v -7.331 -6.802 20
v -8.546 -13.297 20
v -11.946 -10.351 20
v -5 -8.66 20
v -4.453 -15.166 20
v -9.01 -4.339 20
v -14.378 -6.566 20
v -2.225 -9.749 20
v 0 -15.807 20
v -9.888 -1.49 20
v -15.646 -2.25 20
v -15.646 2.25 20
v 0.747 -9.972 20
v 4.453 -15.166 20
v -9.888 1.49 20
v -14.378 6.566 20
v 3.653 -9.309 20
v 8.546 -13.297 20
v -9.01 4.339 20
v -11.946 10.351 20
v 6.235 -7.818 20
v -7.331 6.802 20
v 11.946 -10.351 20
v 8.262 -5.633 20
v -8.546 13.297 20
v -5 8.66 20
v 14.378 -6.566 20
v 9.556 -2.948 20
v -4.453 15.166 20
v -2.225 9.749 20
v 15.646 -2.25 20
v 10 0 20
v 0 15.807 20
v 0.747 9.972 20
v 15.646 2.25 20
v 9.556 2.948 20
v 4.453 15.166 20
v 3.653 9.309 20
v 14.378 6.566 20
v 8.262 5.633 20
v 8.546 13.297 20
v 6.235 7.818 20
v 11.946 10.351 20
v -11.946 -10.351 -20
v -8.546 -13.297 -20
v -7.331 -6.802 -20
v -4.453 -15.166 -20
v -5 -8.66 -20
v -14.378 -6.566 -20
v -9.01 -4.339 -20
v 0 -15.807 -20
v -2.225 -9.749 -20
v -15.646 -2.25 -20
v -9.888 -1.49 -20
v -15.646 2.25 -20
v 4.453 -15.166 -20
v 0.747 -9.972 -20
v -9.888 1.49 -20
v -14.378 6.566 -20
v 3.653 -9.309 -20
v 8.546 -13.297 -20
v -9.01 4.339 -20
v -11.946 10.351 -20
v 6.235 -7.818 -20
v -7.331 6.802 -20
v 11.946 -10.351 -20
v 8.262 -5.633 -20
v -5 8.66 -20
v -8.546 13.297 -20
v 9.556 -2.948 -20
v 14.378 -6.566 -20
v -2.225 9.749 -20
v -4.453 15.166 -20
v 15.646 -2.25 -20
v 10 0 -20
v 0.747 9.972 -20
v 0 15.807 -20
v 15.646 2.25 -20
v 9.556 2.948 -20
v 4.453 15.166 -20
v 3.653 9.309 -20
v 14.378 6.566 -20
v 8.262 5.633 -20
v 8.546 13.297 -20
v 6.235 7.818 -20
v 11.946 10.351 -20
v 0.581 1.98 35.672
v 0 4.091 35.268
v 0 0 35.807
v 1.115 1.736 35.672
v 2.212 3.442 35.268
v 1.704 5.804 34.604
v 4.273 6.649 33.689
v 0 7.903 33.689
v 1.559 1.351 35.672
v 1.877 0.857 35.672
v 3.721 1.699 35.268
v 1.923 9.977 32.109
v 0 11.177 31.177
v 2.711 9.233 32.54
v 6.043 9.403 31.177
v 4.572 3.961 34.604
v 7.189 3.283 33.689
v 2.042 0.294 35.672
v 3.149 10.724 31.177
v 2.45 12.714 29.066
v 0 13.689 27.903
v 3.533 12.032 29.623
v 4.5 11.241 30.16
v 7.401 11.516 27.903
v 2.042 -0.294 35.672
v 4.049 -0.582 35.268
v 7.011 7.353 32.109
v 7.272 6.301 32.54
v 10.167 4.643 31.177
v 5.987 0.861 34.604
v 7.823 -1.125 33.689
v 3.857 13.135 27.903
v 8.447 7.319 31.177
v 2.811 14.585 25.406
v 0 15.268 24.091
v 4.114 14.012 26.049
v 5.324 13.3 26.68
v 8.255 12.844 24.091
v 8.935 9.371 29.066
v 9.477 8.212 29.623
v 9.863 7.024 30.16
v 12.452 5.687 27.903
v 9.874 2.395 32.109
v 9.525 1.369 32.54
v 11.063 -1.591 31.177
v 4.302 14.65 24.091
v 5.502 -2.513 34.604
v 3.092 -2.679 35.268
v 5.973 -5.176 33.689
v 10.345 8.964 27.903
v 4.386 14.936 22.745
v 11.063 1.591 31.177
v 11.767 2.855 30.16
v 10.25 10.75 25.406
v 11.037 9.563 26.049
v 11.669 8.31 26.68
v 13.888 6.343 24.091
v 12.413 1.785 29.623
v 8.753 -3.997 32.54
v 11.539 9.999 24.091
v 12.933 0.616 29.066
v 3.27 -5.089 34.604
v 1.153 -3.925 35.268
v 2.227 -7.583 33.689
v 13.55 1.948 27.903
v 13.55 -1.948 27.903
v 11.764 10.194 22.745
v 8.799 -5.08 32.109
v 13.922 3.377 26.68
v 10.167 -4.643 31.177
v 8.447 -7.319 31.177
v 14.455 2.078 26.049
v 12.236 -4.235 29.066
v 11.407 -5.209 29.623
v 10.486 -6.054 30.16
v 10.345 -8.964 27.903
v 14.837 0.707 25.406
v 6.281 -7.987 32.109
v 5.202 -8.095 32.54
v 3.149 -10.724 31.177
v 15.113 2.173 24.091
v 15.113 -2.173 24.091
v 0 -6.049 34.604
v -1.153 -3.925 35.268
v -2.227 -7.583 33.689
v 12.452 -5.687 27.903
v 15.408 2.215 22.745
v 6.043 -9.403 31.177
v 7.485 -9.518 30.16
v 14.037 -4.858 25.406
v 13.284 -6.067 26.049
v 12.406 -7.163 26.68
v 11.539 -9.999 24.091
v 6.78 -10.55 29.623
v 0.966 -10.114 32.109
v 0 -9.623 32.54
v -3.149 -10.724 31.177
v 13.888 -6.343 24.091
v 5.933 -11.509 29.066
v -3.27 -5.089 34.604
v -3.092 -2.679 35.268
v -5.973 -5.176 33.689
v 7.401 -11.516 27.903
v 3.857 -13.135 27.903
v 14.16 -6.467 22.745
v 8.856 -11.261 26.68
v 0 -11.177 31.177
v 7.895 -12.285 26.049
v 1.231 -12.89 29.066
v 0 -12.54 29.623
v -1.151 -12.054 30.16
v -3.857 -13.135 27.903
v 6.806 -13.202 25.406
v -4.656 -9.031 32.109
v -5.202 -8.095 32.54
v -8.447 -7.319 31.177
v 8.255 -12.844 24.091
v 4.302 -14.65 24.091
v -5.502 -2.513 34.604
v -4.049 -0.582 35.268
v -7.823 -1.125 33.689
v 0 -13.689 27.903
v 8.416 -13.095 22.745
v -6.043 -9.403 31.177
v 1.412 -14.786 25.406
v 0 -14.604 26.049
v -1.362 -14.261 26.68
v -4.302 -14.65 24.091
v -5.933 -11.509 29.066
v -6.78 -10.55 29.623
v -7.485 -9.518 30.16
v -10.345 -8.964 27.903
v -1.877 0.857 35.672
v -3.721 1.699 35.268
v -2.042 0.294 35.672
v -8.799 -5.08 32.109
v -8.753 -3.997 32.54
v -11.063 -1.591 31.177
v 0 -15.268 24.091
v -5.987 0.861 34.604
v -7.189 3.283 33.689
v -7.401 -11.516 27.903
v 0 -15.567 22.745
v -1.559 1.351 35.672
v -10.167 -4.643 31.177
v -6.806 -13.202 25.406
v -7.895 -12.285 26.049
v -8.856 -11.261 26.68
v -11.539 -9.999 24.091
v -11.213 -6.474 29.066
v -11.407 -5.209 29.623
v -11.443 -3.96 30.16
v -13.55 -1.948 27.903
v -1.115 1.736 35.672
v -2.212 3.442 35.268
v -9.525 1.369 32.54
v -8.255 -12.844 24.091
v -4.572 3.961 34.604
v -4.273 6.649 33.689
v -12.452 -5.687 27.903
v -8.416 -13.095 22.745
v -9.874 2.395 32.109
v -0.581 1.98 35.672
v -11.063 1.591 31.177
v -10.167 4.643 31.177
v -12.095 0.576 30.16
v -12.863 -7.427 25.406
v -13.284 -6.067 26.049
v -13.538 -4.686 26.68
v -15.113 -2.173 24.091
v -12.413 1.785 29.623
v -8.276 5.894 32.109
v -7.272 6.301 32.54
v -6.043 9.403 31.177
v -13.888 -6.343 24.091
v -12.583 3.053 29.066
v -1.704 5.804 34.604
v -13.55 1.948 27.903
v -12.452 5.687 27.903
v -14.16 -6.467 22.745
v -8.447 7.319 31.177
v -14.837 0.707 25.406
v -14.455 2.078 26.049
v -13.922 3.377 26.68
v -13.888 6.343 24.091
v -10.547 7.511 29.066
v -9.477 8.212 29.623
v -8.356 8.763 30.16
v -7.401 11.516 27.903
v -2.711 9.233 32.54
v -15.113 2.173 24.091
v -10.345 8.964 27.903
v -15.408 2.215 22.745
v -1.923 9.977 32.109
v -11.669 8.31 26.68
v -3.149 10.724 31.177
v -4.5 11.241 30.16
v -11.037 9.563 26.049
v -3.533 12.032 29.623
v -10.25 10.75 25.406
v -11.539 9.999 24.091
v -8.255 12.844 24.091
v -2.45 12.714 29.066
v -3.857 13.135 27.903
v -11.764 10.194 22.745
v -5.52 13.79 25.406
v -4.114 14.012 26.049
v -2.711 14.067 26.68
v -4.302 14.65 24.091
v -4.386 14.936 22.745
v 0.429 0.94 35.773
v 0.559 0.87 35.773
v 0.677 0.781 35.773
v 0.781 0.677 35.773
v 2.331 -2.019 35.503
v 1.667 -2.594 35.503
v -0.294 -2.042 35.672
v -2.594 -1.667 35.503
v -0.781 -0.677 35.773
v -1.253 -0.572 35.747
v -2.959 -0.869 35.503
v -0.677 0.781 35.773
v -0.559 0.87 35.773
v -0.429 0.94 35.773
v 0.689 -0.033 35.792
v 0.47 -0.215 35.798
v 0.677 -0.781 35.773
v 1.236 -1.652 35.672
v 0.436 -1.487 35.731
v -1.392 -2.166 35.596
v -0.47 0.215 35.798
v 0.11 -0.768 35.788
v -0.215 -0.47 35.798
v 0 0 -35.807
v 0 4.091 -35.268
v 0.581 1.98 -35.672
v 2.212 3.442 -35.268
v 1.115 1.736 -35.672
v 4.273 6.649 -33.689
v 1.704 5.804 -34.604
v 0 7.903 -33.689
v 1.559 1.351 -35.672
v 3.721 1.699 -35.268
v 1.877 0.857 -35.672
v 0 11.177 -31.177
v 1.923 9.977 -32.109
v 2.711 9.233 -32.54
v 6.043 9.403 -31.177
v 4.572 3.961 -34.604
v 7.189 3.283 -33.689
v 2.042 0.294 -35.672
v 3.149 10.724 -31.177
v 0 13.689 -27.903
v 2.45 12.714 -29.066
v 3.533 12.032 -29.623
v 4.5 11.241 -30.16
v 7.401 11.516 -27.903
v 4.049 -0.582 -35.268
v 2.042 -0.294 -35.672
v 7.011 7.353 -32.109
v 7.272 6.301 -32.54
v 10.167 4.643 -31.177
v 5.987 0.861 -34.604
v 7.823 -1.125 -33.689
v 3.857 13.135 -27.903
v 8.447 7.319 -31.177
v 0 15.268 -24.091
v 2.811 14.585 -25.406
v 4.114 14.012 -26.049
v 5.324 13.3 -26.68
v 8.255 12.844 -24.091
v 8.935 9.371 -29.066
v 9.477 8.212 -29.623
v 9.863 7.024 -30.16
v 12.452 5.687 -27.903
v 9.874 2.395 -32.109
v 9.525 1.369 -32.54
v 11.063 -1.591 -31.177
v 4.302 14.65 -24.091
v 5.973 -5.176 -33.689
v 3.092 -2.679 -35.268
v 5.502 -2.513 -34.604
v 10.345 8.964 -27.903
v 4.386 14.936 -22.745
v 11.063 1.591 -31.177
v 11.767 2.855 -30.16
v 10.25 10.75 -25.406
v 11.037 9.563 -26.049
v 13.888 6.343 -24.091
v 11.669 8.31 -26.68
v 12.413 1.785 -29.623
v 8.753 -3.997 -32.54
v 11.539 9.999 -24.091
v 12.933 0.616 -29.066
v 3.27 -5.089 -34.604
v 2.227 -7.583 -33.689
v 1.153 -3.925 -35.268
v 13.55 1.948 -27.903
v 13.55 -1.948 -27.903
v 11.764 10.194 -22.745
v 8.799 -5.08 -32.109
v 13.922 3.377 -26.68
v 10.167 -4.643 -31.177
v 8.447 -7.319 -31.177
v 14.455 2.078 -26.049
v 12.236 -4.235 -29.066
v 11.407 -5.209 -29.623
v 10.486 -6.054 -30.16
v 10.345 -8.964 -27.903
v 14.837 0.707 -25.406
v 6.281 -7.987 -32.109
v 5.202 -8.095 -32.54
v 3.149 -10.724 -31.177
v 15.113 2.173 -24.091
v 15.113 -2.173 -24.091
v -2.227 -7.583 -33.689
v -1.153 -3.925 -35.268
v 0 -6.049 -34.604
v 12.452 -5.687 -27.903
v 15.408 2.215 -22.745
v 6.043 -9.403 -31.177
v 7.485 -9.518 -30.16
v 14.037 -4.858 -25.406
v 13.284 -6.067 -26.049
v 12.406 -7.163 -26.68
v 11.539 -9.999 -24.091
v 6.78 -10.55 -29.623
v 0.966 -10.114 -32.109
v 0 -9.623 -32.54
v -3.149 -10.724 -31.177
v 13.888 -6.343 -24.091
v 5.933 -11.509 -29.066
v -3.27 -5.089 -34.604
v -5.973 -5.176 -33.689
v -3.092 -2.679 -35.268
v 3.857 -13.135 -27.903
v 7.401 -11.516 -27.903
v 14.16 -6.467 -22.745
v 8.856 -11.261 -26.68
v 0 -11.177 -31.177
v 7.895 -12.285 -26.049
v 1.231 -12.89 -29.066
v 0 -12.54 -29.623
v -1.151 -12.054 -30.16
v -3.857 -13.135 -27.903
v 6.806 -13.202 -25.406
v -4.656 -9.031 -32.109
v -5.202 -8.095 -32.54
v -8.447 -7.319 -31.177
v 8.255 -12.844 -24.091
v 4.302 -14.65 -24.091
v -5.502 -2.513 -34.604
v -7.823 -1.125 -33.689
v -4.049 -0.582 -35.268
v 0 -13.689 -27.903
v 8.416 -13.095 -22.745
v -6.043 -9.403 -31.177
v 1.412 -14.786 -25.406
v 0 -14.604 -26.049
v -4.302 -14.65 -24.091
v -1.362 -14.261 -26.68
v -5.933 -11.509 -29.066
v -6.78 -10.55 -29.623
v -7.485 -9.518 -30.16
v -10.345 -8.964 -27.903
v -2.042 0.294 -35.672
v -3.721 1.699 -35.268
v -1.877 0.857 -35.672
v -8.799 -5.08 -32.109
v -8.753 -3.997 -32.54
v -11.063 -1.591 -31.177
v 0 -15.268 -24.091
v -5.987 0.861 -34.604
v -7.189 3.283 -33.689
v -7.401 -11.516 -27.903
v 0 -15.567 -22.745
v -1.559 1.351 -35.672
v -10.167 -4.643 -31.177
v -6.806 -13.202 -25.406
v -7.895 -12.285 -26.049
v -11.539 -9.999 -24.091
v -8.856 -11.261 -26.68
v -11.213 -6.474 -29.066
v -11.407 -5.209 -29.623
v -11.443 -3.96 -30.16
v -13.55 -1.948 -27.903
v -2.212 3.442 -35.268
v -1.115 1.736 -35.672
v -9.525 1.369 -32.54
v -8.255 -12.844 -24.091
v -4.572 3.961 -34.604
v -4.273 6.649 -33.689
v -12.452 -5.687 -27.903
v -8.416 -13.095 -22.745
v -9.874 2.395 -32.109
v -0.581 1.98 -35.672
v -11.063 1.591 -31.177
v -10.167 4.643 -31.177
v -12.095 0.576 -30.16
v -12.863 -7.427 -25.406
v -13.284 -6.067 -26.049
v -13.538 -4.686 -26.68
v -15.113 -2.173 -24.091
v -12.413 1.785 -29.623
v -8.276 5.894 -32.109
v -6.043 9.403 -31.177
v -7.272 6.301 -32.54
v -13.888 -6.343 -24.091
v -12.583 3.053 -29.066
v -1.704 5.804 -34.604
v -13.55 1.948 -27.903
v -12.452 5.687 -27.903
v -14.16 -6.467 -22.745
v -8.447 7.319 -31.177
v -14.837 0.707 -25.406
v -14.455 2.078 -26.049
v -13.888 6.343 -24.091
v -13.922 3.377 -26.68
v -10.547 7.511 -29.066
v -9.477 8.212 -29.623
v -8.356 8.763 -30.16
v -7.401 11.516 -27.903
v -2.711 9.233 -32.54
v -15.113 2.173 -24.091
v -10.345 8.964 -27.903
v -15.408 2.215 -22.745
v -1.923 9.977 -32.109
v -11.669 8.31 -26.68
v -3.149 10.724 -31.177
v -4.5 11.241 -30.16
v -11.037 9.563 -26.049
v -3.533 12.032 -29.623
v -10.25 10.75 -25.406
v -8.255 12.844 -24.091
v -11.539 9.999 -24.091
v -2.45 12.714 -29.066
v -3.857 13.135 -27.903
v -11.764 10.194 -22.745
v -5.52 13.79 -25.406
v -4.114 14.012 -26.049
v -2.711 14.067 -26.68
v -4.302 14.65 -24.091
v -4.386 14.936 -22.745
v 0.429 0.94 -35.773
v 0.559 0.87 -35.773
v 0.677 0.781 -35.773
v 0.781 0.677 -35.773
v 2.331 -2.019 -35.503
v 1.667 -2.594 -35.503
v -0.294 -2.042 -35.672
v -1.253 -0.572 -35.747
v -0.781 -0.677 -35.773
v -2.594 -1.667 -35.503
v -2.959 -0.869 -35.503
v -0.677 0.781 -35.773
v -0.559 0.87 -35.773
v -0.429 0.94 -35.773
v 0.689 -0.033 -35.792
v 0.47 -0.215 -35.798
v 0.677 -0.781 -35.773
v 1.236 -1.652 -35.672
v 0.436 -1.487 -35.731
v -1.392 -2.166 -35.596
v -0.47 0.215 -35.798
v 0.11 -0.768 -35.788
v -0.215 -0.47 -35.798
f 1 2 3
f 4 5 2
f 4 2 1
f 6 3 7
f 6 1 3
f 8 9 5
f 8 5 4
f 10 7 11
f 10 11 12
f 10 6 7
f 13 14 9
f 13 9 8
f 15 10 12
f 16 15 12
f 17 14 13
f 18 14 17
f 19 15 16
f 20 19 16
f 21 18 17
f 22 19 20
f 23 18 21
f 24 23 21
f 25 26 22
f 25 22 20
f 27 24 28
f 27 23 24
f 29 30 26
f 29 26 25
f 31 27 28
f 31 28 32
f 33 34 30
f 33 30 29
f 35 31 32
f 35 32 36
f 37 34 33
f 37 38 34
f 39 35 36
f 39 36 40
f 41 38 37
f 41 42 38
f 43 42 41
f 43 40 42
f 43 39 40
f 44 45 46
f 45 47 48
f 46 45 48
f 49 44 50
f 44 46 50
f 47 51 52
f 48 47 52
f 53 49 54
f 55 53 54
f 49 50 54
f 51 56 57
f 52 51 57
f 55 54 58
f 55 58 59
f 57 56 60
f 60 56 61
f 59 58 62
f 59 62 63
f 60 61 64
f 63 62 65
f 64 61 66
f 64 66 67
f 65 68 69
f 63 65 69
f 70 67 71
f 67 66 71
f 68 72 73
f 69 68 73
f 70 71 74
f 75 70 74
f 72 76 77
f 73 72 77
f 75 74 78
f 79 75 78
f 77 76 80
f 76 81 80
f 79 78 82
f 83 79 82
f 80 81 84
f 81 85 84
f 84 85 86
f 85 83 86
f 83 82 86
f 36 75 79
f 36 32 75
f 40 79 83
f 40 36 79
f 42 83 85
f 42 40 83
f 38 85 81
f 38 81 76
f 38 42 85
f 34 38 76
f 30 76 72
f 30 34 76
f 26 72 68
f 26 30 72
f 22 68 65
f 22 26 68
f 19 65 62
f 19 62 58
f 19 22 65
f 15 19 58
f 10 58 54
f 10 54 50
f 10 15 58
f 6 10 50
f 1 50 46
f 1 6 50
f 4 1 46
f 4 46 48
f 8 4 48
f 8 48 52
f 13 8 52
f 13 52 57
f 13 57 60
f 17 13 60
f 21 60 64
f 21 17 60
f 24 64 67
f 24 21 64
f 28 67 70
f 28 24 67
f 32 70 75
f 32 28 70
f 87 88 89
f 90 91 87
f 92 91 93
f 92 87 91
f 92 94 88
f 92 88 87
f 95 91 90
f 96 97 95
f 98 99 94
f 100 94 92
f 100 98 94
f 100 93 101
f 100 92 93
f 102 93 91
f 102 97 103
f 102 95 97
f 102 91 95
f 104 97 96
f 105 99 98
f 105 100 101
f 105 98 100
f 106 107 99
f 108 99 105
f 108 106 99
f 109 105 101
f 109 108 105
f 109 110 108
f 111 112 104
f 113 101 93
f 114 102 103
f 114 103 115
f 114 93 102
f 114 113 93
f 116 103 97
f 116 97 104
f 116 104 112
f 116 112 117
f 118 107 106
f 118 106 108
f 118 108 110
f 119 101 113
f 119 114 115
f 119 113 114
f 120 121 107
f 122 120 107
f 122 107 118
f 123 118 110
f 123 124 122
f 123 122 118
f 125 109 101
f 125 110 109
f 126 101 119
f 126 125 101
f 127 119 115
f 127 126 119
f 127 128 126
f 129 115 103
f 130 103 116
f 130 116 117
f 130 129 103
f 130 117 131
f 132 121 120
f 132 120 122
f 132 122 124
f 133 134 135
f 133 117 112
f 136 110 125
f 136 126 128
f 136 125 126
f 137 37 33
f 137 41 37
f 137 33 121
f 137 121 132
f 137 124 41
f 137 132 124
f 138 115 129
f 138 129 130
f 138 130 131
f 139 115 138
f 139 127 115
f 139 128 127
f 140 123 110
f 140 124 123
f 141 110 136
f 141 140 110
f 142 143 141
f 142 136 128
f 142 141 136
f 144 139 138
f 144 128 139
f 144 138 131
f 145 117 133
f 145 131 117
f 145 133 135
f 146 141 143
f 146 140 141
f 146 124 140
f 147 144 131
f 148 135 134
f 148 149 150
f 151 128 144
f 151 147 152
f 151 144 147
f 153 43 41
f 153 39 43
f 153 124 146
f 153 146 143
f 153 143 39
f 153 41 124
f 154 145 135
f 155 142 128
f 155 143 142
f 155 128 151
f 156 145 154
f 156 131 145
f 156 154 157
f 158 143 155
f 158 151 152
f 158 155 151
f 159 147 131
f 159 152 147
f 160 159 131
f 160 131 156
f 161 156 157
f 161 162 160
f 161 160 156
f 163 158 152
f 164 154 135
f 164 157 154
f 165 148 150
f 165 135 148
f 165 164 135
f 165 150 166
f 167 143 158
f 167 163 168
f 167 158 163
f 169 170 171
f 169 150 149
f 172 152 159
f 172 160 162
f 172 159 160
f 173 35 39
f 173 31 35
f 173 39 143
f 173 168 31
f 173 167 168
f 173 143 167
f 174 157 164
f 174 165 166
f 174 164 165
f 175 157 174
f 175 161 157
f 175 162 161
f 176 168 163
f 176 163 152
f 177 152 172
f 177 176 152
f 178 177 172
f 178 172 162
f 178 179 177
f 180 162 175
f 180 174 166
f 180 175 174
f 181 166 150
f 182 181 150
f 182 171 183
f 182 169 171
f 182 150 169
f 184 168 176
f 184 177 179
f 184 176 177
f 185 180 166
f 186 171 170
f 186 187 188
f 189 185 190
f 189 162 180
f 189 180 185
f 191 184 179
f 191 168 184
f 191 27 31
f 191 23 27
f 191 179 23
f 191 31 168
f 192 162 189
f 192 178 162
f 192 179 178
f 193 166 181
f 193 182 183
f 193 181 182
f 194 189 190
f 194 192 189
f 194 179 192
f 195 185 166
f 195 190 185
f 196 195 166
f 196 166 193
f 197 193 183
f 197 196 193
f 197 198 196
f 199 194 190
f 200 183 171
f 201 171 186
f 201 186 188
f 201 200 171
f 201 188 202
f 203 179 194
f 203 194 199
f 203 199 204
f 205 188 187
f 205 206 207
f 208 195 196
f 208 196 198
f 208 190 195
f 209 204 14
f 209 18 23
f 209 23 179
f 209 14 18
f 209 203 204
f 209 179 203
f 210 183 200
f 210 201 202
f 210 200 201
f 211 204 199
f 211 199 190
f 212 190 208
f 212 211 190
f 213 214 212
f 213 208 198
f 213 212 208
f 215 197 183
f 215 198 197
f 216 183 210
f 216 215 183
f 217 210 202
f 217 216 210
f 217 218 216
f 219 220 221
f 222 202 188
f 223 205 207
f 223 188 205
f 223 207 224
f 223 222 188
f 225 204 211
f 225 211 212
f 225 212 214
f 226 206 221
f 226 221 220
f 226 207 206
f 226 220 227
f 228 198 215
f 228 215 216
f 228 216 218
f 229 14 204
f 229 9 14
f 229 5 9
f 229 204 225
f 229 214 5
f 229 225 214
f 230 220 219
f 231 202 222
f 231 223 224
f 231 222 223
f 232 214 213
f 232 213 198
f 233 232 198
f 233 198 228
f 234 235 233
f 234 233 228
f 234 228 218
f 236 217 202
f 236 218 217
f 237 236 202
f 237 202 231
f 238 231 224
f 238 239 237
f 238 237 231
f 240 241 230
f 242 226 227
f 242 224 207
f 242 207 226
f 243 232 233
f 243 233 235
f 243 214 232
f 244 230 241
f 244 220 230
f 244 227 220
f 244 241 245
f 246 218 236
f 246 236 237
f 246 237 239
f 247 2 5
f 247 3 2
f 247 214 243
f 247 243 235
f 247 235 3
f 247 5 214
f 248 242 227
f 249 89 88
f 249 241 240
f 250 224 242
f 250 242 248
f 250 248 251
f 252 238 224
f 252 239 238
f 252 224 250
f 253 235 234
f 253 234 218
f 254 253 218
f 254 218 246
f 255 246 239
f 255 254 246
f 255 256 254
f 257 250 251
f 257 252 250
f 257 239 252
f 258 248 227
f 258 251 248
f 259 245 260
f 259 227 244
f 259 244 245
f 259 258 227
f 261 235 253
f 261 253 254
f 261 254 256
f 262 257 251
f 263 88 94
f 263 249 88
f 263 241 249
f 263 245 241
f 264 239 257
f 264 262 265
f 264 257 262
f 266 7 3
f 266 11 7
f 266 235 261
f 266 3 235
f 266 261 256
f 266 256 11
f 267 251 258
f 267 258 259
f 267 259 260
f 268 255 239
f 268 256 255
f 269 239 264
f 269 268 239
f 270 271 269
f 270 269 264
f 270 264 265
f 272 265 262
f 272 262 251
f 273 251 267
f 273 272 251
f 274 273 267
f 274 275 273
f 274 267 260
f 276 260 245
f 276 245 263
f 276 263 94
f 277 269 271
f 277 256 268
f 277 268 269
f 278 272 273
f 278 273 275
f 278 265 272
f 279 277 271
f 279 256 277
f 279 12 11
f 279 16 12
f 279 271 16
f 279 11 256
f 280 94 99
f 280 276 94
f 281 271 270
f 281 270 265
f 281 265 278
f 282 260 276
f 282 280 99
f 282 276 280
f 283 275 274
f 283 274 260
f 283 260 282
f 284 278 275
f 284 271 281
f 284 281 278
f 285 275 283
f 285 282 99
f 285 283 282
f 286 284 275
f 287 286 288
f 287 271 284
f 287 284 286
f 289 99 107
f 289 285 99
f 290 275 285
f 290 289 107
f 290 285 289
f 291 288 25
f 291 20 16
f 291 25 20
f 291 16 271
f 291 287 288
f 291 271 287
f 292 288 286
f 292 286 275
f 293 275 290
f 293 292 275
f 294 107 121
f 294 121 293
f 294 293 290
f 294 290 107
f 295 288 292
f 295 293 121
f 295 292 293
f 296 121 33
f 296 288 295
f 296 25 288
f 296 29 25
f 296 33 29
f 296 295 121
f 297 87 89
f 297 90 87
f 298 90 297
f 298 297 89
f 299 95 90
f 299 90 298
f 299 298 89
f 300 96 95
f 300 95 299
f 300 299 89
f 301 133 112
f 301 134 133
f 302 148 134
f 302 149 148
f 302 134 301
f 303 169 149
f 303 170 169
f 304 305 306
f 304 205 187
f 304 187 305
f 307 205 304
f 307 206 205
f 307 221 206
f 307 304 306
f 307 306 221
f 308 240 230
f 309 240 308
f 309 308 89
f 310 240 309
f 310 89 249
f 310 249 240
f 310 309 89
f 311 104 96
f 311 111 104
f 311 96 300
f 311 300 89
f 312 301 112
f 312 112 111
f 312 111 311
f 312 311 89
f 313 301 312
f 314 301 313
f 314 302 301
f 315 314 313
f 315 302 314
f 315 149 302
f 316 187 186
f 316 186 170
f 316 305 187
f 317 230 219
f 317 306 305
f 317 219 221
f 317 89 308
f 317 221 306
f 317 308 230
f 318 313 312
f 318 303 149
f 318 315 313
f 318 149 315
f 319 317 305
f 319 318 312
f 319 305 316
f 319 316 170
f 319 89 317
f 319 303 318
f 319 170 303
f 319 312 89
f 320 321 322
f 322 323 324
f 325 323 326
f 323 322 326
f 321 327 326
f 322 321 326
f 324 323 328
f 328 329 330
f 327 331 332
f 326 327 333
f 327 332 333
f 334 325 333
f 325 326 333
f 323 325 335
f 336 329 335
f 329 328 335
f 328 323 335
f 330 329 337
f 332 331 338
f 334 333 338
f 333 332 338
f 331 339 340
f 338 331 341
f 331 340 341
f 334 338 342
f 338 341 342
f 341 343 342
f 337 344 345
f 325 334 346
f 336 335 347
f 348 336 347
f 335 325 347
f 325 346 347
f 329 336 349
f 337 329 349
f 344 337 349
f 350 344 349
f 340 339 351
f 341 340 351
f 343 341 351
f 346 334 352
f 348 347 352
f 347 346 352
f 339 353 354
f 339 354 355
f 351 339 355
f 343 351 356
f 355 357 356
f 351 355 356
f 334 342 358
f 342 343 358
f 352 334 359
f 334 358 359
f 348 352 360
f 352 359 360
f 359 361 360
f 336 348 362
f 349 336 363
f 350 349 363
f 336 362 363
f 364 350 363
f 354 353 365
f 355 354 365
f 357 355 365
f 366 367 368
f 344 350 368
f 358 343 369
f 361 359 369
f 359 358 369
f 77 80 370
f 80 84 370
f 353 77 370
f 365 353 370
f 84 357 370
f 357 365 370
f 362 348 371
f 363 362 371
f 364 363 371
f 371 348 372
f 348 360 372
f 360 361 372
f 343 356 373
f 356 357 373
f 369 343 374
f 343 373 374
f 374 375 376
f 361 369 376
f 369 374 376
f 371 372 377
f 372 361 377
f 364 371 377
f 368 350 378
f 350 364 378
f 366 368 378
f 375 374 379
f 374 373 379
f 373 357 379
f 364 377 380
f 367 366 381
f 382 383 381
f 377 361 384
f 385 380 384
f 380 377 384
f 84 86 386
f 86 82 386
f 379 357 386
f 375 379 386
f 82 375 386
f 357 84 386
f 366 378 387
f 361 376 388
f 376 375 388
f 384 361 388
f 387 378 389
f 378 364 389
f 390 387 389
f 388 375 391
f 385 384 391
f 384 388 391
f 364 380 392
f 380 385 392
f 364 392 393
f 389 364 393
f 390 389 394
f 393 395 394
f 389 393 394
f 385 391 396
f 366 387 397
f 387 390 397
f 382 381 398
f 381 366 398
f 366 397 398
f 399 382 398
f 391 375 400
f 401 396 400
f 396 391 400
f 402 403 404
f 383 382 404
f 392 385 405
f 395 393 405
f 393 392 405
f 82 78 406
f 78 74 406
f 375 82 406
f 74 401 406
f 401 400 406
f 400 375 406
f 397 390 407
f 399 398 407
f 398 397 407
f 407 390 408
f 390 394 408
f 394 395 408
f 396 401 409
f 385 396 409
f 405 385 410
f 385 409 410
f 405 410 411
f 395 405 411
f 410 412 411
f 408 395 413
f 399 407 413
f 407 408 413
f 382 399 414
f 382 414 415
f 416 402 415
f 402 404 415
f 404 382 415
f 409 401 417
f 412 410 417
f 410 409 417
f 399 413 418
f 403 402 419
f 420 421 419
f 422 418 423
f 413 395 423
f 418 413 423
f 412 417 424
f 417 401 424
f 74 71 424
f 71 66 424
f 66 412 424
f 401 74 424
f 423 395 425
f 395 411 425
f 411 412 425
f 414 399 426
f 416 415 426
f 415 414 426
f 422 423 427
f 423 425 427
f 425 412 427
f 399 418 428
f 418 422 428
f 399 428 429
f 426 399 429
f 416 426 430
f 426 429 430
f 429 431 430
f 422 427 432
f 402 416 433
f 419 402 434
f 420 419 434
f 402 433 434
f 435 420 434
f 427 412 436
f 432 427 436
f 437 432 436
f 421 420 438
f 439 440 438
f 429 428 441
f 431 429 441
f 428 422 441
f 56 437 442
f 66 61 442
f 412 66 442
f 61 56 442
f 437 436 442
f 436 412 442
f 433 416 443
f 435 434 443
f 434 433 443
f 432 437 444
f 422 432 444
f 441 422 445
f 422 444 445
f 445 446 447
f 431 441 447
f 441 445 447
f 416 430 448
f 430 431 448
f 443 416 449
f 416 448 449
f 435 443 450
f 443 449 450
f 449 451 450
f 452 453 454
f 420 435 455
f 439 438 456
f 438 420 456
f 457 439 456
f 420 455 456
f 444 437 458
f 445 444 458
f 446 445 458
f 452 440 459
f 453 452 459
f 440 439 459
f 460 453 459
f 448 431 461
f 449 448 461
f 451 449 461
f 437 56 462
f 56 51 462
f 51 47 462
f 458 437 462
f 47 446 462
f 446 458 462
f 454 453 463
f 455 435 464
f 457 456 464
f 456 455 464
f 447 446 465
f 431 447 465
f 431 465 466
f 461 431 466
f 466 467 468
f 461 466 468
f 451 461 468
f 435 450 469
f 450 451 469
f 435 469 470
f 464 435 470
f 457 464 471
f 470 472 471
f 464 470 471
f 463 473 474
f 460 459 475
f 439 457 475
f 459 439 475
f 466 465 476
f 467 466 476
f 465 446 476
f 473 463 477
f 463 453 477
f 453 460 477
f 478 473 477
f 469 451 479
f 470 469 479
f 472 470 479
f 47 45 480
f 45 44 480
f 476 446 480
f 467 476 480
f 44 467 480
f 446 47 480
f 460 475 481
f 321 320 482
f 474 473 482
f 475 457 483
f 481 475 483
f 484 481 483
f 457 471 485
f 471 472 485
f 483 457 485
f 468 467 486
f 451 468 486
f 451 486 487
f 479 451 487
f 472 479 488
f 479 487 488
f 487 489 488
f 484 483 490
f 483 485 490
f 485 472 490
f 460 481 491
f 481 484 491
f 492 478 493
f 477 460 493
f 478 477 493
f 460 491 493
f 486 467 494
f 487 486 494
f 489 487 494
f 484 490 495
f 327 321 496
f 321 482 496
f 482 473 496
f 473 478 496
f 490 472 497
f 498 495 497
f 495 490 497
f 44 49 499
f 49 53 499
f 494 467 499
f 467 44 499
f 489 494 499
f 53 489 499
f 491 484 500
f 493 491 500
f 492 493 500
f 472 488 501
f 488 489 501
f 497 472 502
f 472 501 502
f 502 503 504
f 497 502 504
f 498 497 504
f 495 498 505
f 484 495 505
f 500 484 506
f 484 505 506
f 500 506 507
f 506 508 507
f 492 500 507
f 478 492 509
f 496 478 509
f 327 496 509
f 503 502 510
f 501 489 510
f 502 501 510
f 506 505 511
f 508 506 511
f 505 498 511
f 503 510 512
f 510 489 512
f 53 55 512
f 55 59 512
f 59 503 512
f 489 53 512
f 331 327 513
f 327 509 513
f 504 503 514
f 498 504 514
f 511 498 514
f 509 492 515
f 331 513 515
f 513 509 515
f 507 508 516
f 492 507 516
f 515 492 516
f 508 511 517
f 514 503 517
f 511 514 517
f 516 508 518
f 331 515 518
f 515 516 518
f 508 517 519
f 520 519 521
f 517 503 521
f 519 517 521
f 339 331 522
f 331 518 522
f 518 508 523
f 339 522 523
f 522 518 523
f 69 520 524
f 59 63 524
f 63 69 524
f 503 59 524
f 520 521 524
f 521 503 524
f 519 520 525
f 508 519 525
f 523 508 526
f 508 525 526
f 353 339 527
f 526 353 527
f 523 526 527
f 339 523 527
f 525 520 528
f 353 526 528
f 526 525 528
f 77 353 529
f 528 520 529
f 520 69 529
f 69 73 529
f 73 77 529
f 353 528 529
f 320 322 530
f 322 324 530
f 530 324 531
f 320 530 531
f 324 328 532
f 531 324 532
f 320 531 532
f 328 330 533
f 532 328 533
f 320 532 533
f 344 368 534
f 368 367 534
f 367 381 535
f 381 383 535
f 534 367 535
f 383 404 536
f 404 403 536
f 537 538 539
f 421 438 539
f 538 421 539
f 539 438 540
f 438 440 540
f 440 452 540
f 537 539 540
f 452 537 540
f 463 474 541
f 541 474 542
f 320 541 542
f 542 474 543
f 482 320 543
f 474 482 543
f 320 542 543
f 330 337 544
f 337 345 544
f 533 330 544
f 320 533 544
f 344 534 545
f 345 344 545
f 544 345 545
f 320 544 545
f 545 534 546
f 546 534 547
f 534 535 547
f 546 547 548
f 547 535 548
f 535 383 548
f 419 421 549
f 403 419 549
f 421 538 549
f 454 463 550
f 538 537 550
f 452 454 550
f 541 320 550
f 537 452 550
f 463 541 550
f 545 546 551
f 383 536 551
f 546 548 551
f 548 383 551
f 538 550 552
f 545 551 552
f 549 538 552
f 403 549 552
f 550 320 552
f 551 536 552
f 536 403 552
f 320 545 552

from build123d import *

# Parameters (mm, degrees)
F0_R     = 10
F1_DEPTH = 20


with BuildPart() as f1:
    # F0 (on Top) → F1 (new body, symmetric)
    with BuildSketch(Plane.XY):
        Circle(F0_R)
    extrude(amount=F1_DEPTH, both=True)

    # F2 (on Right) → F3 (revolve)
    with BuildSketch(Plane.YZ):
        with BuildLine():
            Line((15.806751, -20), (0, -20))
            Line((0, -20), (0, -35.806751))
            ThreePointArc((0, -35.806751), (11.177061, -31.177061), (15.806751, -20))
        make_face()
    revolve(axis=Axis((0, 0, -27.903376), (0, 0, -1)))

    # F4: F1 across plane


with BuildPart() as f1_1:
    add(f1.part)
    add(f1.part.mirror(Plane.XY))


solid = f1_1.part
